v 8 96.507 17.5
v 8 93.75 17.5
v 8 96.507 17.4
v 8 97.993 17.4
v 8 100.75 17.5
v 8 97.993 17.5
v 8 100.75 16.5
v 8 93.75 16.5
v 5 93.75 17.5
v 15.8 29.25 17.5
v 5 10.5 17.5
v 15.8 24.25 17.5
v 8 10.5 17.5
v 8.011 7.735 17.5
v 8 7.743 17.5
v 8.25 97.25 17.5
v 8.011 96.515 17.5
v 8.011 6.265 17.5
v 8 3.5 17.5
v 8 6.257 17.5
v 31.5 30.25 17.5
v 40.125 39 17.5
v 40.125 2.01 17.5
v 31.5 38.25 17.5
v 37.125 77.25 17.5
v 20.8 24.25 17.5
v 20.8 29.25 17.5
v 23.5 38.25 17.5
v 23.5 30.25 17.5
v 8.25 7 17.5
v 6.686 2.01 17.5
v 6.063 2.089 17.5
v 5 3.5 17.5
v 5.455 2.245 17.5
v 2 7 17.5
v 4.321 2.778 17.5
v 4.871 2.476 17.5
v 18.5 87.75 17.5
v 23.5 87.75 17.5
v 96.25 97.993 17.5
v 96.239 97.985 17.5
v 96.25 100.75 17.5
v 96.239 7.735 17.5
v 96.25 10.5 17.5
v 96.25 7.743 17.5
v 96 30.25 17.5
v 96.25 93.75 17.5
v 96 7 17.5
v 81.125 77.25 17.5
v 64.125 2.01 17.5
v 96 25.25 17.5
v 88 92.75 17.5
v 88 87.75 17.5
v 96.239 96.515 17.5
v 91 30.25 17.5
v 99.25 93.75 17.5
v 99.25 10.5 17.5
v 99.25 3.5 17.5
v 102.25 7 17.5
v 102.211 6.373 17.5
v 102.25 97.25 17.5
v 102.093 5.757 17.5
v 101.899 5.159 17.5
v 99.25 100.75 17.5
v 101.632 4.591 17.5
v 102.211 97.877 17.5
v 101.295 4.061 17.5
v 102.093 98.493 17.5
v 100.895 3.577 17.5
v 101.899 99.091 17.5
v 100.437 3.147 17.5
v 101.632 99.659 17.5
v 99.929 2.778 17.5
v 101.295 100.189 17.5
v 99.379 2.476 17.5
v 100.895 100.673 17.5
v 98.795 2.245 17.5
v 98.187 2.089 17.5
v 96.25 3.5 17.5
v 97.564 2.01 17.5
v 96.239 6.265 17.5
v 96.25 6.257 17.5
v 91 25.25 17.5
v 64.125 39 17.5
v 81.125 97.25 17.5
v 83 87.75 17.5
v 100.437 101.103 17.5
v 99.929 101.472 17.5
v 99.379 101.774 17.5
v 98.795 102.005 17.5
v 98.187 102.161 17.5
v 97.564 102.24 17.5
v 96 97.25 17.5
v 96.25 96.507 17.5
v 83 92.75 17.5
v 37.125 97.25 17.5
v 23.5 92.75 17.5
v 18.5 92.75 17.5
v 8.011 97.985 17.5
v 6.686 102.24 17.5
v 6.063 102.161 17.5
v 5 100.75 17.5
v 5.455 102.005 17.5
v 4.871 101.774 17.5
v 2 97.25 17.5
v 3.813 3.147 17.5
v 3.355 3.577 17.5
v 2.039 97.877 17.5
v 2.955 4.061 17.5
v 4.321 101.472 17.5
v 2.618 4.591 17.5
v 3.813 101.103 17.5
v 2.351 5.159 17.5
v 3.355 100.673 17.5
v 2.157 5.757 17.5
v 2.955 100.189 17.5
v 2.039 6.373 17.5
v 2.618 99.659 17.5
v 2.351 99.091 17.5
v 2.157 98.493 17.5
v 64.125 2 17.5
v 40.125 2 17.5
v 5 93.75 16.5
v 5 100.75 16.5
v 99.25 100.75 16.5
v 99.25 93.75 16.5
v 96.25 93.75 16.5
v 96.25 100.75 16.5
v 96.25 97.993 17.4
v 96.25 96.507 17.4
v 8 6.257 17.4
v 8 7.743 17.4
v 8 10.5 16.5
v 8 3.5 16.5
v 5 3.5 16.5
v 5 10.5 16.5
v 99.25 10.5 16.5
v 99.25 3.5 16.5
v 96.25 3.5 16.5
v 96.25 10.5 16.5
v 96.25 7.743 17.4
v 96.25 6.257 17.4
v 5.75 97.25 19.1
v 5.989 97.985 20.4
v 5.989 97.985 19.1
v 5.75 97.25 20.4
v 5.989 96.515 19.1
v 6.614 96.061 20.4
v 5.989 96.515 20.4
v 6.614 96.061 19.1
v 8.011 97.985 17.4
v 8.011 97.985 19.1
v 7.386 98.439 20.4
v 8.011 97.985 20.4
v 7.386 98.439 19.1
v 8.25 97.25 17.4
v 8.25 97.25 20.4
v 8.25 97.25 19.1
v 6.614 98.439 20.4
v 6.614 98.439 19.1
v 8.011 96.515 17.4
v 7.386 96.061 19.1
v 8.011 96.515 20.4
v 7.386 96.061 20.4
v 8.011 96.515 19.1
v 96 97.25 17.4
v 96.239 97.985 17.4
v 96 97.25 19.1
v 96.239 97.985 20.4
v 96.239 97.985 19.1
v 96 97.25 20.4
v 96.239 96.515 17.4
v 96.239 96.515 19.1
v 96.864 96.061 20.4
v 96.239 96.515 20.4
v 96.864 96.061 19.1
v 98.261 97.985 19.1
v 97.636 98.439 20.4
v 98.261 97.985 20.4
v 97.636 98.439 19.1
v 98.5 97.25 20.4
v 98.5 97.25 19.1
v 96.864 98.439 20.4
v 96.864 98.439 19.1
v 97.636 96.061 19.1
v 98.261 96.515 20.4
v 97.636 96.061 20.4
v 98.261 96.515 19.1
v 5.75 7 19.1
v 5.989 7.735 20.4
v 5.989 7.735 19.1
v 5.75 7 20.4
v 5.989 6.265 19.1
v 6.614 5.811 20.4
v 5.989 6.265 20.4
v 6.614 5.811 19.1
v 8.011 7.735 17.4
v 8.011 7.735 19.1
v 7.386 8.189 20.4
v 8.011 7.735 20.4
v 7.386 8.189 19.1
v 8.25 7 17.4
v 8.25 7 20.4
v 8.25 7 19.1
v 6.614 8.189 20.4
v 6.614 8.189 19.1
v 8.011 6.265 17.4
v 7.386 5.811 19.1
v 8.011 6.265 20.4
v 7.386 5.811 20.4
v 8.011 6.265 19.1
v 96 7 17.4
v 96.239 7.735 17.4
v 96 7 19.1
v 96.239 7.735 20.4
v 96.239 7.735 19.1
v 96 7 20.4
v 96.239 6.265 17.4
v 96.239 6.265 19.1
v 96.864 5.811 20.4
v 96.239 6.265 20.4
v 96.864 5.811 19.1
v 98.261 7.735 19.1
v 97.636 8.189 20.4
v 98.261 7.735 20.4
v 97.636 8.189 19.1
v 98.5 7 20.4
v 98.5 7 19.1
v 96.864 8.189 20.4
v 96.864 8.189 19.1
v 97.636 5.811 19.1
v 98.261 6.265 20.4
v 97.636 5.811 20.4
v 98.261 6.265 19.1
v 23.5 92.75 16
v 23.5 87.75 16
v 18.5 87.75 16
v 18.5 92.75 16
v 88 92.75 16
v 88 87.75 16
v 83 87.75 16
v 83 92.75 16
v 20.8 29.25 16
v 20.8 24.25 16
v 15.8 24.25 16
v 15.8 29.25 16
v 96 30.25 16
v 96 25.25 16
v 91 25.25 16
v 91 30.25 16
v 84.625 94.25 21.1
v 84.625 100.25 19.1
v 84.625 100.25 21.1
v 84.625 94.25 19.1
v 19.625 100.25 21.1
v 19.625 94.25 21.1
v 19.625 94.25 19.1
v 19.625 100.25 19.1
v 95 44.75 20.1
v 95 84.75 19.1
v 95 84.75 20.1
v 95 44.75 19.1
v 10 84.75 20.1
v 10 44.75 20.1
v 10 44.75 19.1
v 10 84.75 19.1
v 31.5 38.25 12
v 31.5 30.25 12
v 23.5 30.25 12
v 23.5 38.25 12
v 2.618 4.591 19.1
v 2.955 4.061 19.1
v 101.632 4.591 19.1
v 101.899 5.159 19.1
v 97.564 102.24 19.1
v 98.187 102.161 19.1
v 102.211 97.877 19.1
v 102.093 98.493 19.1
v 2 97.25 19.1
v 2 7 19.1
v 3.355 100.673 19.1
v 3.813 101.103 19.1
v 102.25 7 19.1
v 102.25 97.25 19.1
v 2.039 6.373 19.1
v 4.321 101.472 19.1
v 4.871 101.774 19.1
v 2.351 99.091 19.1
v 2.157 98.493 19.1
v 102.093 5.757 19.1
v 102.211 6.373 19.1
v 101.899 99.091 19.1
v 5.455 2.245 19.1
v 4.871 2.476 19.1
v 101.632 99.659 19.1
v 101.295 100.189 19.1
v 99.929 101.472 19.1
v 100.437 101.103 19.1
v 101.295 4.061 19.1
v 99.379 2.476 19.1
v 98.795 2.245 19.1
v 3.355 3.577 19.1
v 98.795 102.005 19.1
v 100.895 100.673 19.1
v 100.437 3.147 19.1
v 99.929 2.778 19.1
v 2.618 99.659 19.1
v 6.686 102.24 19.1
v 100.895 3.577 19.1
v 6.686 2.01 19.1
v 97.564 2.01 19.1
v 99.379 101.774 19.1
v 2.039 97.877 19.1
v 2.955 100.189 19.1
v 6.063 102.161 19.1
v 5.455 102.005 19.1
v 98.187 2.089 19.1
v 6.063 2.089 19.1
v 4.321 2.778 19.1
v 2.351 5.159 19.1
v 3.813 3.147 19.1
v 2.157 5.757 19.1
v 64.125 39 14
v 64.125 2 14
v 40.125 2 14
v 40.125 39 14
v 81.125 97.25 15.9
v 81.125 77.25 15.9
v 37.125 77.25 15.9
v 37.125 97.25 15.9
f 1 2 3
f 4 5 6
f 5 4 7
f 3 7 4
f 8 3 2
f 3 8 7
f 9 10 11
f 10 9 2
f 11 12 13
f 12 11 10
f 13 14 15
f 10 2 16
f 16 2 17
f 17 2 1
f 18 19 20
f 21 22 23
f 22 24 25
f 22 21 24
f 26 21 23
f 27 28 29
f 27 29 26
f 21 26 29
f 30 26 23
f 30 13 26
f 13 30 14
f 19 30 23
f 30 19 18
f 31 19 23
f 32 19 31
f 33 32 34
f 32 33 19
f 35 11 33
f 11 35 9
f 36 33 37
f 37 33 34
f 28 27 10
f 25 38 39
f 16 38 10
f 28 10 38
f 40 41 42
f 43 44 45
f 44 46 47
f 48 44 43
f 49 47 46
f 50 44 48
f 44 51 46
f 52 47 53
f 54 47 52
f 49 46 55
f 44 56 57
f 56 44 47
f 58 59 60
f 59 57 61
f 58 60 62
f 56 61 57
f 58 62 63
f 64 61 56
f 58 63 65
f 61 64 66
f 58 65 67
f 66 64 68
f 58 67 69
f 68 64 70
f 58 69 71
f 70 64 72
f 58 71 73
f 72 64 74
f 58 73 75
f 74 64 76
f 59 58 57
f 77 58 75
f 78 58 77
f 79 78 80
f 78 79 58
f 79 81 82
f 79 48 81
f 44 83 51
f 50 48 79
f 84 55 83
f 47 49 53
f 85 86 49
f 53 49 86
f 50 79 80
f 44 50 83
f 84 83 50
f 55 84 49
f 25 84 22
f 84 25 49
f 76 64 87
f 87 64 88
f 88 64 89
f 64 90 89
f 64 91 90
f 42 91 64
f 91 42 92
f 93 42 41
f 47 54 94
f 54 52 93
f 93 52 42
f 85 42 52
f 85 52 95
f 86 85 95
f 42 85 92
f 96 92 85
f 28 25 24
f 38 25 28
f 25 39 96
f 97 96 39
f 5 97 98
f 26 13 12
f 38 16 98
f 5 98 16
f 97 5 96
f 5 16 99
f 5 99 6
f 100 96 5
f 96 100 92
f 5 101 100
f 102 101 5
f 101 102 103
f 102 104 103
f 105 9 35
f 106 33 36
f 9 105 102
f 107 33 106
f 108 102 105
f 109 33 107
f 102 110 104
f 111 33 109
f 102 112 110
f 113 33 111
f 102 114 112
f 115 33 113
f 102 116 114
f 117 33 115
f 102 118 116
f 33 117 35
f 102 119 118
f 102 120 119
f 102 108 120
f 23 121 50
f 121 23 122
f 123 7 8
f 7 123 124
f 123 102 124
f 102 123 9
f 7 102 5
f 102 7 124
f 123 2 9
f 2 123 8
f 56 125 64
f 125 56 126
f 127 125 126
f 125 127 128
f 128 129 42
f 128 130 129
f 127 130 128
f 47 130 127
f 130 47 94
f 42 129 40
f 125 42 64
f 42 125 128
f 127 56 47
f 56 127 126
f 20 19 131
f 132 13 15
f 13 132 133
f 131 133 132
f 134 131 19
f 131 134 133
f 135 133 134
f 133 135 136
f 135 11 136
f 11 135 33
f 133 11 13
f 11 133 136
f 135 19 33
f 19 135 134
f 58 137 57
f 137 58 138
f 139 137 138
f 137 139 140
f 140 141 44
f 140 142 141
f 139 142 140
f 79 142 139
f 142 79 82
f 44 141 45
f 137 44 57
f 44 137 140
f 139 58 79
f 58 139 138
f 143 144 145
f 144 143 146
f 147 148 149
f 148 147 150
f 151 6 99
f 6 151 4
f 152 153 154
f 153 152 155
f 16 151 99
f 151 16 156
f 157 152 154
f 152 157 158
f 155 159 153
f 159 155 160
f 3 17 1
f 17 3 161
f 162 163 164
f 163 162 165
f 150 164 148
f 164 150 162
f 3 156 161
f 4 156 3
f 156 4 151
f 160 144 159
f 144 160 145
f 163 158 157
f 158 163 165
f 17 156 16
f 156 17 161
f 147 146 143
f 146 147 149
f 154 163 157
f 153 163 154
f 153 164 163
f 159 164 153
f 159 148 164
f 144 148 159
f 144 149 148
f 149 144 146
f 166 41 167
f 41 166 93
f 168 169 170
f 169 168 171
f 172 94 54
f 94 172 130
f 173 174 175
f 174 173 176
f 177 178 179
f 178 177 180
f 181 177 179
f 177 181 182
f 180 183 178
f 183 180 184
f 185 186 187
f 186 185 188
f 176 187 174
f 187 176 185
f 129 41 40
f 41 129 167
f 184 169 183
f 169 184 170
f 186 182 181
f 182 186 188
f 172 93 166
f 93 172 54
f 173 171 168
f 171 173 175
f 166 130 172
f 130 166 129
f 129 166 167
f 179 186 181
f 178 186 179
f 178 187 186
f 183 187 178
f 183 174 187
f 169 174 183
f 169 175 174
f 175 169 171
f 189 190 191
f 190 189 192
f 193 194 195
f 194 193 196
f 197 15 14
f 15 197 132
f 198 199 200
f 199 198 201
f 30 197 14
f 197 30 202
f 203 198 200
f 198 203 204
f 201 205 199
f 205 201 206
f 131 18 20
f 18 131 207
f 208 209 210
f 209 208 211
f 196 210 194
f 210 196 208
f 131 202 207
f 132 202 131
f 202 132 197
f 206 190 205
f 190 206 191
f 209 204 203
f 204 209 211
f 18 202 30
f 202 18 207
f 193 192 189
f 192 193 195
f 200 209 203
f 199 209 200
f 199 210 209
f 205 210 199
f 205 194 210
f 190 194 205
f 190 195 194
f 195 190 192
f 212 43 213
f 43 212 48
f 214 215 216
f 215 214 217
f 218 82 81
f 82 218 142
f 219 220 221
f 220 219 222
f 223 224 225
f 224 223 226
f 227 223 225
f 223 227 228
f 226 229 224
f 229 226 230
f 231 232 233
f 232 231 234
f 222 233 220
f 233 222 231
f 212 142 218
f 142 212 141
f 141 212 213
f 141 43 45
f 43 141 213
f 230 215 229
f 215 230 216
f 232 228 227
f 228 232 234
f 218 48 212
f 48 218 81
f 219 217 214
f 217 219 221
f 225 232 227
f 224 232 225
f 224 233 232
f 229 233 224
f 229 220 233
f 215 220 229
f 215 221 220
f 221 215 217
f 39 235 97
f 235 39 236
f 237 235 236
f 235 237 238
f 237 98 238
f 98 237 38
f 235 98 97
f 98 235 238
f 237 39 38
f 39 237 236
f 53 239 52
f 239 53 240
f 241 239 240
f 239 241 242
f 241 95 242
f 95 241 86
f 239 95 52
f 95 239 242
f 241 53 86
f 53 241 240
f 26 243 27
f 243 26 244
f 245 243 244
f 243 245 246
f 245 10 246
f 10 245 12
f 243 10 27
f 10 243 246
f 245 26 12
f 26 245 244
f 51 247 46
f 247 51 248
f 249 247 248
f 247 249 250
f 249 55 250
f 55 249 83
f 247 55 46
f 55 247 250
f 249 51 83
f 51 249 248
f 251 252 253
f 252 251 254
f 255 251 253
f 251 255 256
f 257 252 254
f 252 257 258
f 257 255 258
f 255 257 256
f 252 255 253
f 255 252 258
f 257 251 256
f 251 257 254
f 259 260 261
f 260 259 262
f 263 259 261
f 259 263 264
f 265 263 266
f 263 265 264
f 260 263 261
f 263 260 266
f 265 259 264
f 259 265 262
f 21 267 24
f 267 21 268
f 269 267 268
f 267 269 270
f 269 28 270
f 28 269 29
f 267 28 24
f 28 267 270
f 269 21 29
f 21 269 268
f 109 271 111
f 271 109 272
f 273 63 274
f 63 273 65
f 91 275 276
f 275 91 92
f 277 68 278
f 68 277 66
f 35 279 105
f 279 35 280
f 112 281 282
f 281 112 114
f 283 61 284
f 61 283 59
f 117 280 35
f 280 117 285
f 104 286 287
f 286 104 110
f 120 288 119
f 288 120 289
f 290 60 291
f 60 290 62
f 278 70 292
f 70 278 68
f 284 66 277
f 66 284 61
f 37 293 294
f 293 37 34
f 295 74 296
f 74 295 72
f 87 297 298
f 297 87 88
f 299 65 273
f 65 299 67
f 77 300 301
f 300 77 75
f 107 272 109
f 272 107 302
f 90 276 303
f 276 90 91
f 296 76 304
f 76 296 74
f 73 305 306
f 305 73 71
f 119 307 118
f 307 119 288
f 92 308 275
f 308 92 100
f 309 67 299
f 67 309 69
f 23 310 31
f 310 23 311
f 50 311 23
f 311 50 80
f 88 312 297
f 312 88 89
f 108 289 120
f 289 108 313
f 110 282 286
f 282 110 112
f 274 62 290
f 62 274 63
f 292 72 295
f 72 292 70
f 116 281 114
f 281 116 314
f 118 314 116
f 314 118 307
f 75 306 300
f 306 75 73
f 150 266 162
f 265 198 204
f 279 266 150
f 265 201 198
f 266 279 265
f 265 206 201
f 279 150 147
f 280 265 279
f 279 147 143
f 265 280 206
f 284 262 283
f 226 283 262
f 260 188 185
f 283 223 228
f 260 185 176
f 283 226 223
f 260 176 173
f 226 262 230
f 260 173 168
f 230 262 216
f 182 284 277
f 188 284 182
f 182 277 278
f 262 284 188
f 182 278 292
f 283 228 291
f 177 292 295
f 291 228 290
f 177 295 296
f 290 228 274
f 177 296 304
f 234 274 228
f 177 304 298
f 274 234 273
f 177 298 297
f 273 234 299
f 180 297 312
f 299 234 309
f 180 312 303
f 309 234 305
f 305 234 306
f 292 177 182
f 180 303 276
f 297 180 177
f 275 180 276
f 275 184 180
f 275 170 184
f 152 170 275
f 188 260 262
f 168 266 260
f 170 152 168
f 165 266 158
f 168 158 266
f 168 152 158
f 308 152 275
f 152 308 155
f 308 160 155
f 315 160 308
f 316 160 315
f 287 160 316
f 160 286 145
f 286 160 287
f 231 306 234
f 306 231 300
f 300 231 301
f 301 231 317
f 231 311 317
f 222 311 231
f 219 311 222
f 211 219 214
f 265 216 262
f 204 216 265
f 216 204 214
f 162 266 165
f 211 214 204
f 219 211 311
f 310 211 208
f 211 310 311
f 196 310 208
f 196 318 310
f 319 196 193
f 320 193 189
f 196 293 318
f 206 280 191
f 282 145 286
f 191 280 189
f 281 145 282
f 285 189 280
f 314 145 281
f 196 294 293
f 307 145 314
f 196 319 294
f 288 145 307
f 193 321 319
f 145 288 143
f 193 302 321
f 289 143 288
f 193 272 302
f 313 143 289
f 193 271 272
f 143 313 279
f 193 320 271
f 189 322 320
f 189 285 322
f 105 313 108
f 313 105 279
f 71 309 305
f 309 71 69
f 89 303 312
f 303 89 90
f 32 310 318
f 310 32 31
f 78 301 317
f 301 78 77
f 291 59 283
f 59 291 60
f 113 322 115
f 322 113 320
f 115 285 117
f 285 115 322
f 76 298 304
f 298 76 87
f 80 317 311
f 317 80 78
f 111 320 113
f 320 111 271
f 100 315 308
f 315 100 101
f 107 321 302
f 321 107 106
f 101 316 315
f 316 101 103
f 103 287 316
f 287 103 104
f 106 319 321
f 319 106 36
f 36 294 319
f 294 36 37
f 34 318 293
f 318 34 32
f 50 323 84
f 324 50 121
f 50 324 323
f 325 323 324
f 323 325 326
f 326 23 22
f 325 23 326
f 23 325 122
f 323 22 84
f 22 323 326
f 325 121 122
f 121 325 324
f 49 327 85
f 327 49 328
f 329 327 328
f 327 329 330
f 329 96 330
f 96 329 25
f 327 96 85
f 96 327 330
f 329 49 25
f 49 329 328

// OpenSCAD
// -----------------------------------------------------------------
// Jedi Light Switch Enclosure.
// Designed to be an enclosure for the Jedi Light Switch PCB
// and fit over a UK (Possibly EU) Lightswitch.
// -----------------------------------------------------------------

// Define the switch type to be covered.
// This only effects the switch modeled to help visualise the case
// It does not effect the base or cover stl's.
// New style Single switch = 0
// New style Double switch = 1 - not implemented.
// Old style Single switch = 2
// Old style Double switch = 3
switchType  = 0; // Update depth also

// How deep the base & cover should be.
// For new style switch:
// depth = 16; // 19mm Gives plenty of room in new switches.
// For old style
depth = 19; // 28mm gives plenty
// Super skinny - helpful for test print to check sizes.
// depth = 5;

// Set to true to a minalist cover, goes a few mm over the PCB
// leaving most of the PCB exposed.
minimalCover = false;

// Which version of the PCB is to be used.
// The effects which cutouts are required
// at the top of the cover.
pcbVersion = 2;

// How deep to make the USB connector cutout.
// For ease of use this should be the same as, or deeper than 
// the depth of the cover so the cover can be fitted/removed 
// without disconnecting the USB connector.
usbConnectorCutoutDepth = depth;

// The gap to leave between the cover and the base when pushed together.
// Adjust this to give a tighter (smaller number) or looser (larger number) fit between
// the base and the cover. This will depend on your printer.
coverToBasegap = 0.2;

// Change these to show the various main components.
// They are modified through command line calls when generating STL files.
// e.g To generate the base stl file set showBase to true and everything else
// to false.
showCover = false;
showBase = false;
showPcb = true;
showSwitch = false;


// ------------------------------------------------------


            
// Size of the outer bezel that surounds the PCB
bezelSize = 2;

// Thickness of the cover wall.
// PCB overlap onto support = 2
// then add the bezel size to allow for an overall wall thickness.
wallThickness = 2 + bezelSize; // top wall thickness.
sideWallThickness = 2 + bezelSize;

// -----------------------------------------------------------------
// Jedi lightswitch PCB details
// -----------------------------------------------------------------
// PCB size we are trying to fit.
// PCB is 100, allow a small bodge
pcbHeight = 100.25;
pcbWidth = 100.25;
// How thick (deep) the front panel is (1.6mm FR4 PCB)
pcbThickness = 1.6;
// -----------------------------------------------------------------

// -----------------------------------------------------------------
// Compute the actual overall size required 
// for the outer enclosure.
// -----------------------------------------------------------------
height = pcbHeight + (2*bezelSize);
width = pcbWidth + (2*bezelSize);
// -----------------------------------------------------------------

// -----------------------------------------------------------------
// Wall Switch size (physical size of the light switch being covered)
// -----------------------------------------------------------------
switchHeight = pcbHeight-15; //88;
// switchWidth = 88;  // Original value.
switchWidth = 85; // Newer switches.
// How deep the switch is at the deepest part (e.g. to the top of the switches switch).
switchDepth = 22;
// How much the switch body should overlap onto the base
switchOverlap = 3;

middleDepth = 10;

// How deep the inside of the box is.
baseInnerThickness = 1;

// -----------------------------------------
// -----------------------------------------
module GenericBase(xDistance, yDistance, zHeight) {
	// roundedBox([xDistance, yDistance, zHeight], 2, true);

	// Create a rectangluar base to work from that
	// is xDistance by yDistance and zHeight height.

	// This is effectivly a cube with rounded corners

	// extend the base out by 3.5 from holes by using minkowski
	// which gives rounded corners to the board in the process
	// matching the Gadgeteer design
	
	$fn=50;
	radius = 5; //bezelSize;


	translate([radius,radius,0]) {
		minkowski()
		{
			// 3D Minkowski sum all dimensions will be the sum of the two object's dimensions
			cube([xDistance-(radius*2), yDistance-(radius*2), zHeight /2]);
			cylinder(r=radius,h=zHeight/2);
		}
	}
}



// -----------------------------------------
// Base for the switch, goes around existing lightswitch.
// -----------------------------------------
module LightSwitchBase() {
	
	difference() {
		union() 
		{
			// Outer base wall
			OuterWall();
		}		
		union() 
		{
			SwitchCutout();
			PcbCutout();
            CutOff();
		}
	}
}

// -----------------------------------------
// Main base outer wall
// -----------------------------------------
module OuterWall() {

    innerCutoutOffset = wallThickness; // bezelSize + x

	difference() {
		union() {
			GenericBase(width, height, depth);
		}
		union() {
			// Cut out the bulk of the inside of the box.
			translate([sideWallThickness, wallThickness, baseInnerThickness]) {
                
                // Rounded interial
				//GenericBase(width - (wallThickness* 2), 
				//					height - (innerCutoutOffset *2), 
				//					(depth - baseInnerThickness) + 1);
                
                // Square interia
                cube([width - (sideWallThickness * 2), 
                    height - (wallThickness *2), 
					(depth - baseInnerThickness) + 1]);
			}
		}
	}
}

// -----------------------------------------
// Cut out an area in the base for the switch allowing
// for an overlap to go under the switch which holds the case to the wall.
// -----------------------------------------
module SwitchCutout() {

	// Cutout smaller than the actual switch to allow for the overlap all around
	cutoutWidth = switchWidth - (switchOverlap*2);
	cutoutHeight = switchHeight - (switchOverlap*2);	

	// Padding either side of the cutout.
	paddingWidth = (width - cutoutWidth) / 2;
	paddingHeight = -10; // Fixed padding from top.

	// Switch cutout.
	// Cut out a area less wide than the switch so it sits on it 
	// keeping the box against the wall
	// -1 z to ensure it goes all the way through
	translate([paddingWidth, paddingHeight, -1]) {
		cube([cutoutWidth, height, 4]);
	}

	// Switch body
	// Create a block to show how the switch body sits
	// in the base.
	switchOuterPaddingWidth = (width - switchWidth) /2;
	switchOuterPaddingHeight = paddingHeight - switchOverlap;

	translate([switchOuterPaddingWidth , switchOuterPaddingHeight,1]) {
		color( [1, 0, 0, 0.90] ) {
            cube([switchWidth, switchHeight, switchDepth]);
		}
	}
}

// -----------------------------------------
// Cut out an area in the base for the PCB.
// -----------------------------------------
module PcbCutout() {
	// Move to a slight offset to allow for an outer bezel.
	// and position so the top of the pcb is at the top of the base box.
	translate([bezelSize, bezelSize, depth - (pcbThickness - 0.1)]) {
		Pcb();        
	}
}

// -----------------------------------------
// Generate a model of the PCB.
// -----------------------------------------
module Pcb() {
    photonWidth = 24;
    photonHeight = 37;
    photonDepth = 3.5;
        
    // PCB.
    color( "purple" ) {
        GenericBase(pcbWidth, pcbHeight, pcbThickness);
    }
        
    // Photon
    translate([(pcbWidth/2) - (photonWidth /2),0 , -(photonDepth)]) {
        cube([photonWidth, photonHeight, photonDepth]);
    }
        
    // LEDs
    ledOffsetFromSide = 3;
    ledOffsetFromTopBottom = 1.5;
    ledWidth = 3; // Include the resistor and LED and a small fudge for the oversized PCB.
    ledHeight = 7;
    ledDepth = 1;
    
    color( "blue" )  {
        // Top left LED
        // 0,0,0 bottom left.
        translate([
                    0 + ledOffsetFromSide,
                    pcbHeight - ledOffsetFromTopBottom - ledHeight,
                    -ledDepth]) {
            cube ([ledWidth, ledHeight, ledDepth]);
        }
       
        
        // top right LED
        translate([
                    pcbWidth - ledOffsetFromSide - ledWidth,
                    pcbHeight - ledOffsetFromTopBottom - ledHeight,-ledDepth]) {
            cube ([ledWidth, ledHeight, ledDepth]);
        }
        
        // Bottom Left LED.
        translate([
                0 + ledOffsetFromSide,
                ledOffsetFromTopBottom,
                -ledDepth]) {
            cube ([ledWidth, ledHeight, ledDepth]);
        }
        
        // Bottom Right LED.
        translate([
                pcbWidth - ledOffsetFromSide - ledWidth,
                ledOffsetFromTopBottom,
                -ledDepth]) {
            cube ([ledWidth, ledHeight, ledDepth]);
        }
        
        // Show LED holes with LEDs shining through
        // LED hole
        translate([
                    0 + 5,
                    pcbHeight - 5,
                    -0.1]) {
            cylinder(d=2.5, h=3, $fn=10);
        }
        
        translate([
                    pcbWidth - 5,
                    pcbHeight - 5,
                    -0.1]) {
            cylinder(d=2.5, h=3, $fn=10);
        }
        
        translate([
                    0 + 5,
                    5,
                    -0.1]) {
            cylinder(d=2.5, h=3, $fn=10);
        }
        
        translate([pcbWidth - 5,
                    5,
                    -0.1]) {
            cylinder(d=2.5, h=3, $fn=10);
        }
    }
    
    // components for sensors on the base of the board.
    // V1.1 this is not such as issue as they are 4 mm from edge.
    translate([(pcbWidth/2) -15 ,pcbHeight - 25, -pcbThickness]) {
        cube([44, 20, ledDepth + pcbThickness]);
    }
    
    // Show different model of PCB sensors
    // for the second version.
    // TODO: Include battery connector and Neopixels 
    // on the base as well.
    if (pcbVersion == 1) {
        // Humidity and gesture components on the board top.
        // 2.5mm offset from board top.
        // 10mm heihg
        // 6mm wide
        // actually 2mm hight but project 5mm to make it stand out.
        translate([(pcbWidth/2) -3 ,pcbHeight - 10 - 2.5, pcbThickness]) {
            color( "black" ) cube([6, 10, 2]);
        }
        
        // Small raised area to indicade the touch pad.
        // touch pad is 19mm from top.
        // 40mm height
        // 85mm wide
        // 8mm from left/right edge.
        touchPad(19, pcbHeight, pcbThickness );
    } else if (pcbVersion == 2) {
        // Single row of 5 sensors.
        translate([(pcbWidth/2) - 32.5 ,pcbHeight - 8, pcbThickness]) {
            color( "black" ) {
                cube([65, 6, 2]);
            }
        }
        
        // Small raised area to indicade the touch pad.
        // touch pad is 17.5mm from top.
        touchPad(17.5, pcbHeight, pcbThickness);
        
        // Include the JST Connector for V2 as this
        // can hit the switch.
        JSTConnector();
        NeoPixels();
    }
}

module JSTConnector() {
    // 8mm hight
    // 64mm down from top
    // 5.5mm high
    translate([21.5,pcbHeight-8-64, -5.5]) {
        color( "black" ) {
            cube([8, 8, 5.5]);
        }
    }
}

module NeoPixels() {
    NeoPixel(16.5,9.5);
    NeoPixel(81,9.5);
    NeoPixel(13.8,73);
    NeoPixel(89,72);
    
}

module NeoPixel(x,y) {
    neoPixelWidth = 5.0;
    neoPixelHeight = 5.0;
    neoPixelDepth = 1.5;
    
    translate([x,pcbHeight-neoPixelHeight-y, -neoPixelDepth]) {
        color( "yellow" ) {
            cube([neoPixelWidth, neoPixelHeight, neoPixelDepth]);
        }
    }
}

// -----------------------------------------
// Show the touch area on the PCB.
// -----------------------------------------
module touchPad(yPosition, pcbHeight, pcbThickness ) {
    height = 40; 
    width = 85;
    // 8mm from left/right edge.
    translate([8,pcbHeight-height-yPosition, 0]) {
        color( "SteelBlue" )  {
            cube([width , height , pcbThickness + 1]);
        }
    }
}

// -----------------------------------------
// Cutoff the end of the switch to allow it to be pushed over the lightswitch 
// and slid down. The outer cover will hide this missing piece.
// -----------------------------------------
module CutOff() {     
    // +2mm on switch width to allow for a small tolerance.
    cutoutOffset = (width - (switchWidth+2)) / 2;
    cutoutWidth = width - (wallThickness*2) - (switchOverlap*2) + 2*2;
    
    translate([cutoutOffset,0,0]) {
        cube([switchWidth+2,wallThickness  ,depth+2]);
    }
}

// -----------------------------------------
// This is the outer cover that goes over the base and
// holds the PCB in place.
// -----------------------------------------
module Cover() {
    coverWallThickness = 2;
    
    coverWidth = width + coverWallThickness*2;
    coverHeight = height + coverWallThickness*2;
        
    // Cover depth to match the overall depth of the base
    // plus the additional cover top thickness
    // then allow 1mm gap for wall edge variances so it's a snug-ish fit
    // ensuring cover goes fully onto base.
    coverWallOffset = 1;
    coverDepth = depth + coverWallThickness - coverWallOffset;
    coverTopThickness = 1;
       
    usbHeight = 10; // Height here is in the z axid.
    usbWidth = 13;
    
    // How much over the top (sensors) the cover should cover.
    coverTopOverlap = 21;
        
    includeBottomVentHoles = true;
    ventWidth = width - 40;
    ventHeight = 8;
    
    difference() {
		union() {
			GenericBase(coverWidth, coverHeight, coverDepth);
		}
		union() {
            // Hollow out to fit around the base.
            translate([coverWallThickness - coverToBasegap, 
                            coverWallThickness - coverToBasegap, 
                            -coverTopThickness]) {
                    GenericBase(width + (coverToBasegap*2), height + (coverToBasegap*2), coverDepth);
            }
            
            // Cutout for the USB connector...
            translate([(coverWidth/2)-(usbWidth/2),
                        coverHeight - coverWallThickness - 1,
                        depth-(coverTopThickness + usbConnectorCutoutDepth)]) {
                cube([usbWidth,coverWallThickness+2,usbConnectorCutoutDepth]);
                // TODO: Put cylinders on ends to make it rounded.
            }
            
            // Add some vent holes in the bottom to allow air
            // circulation and for light to escape when using "Glow"
            if (includeBottomVentHoles) {
                translate([(coverWidth/2)-(ventWidth/2),
                        coverHeight - coverWallThickness - 1,
                        0]) {
                    #cube([ventWidth,coverWallThickness+2,ventHeight]);
                }
            }
                
            if (minimalCover) {
                // Allow for cover thickness, the base bexel size.
                // base has 2mm PCB overlap
                overlap = coverWallThickness + bezelSize + 2;
                doubleOverlap = overlap * 2;
                
                // Cut out the main PCB area
                translate([overlap,overlap,+2]) {
                    GenericBase(coverWidth-doubleOverlap, coverHeight- doubleOverlap, coverDepth);
                }
            } else {
                if (pcbVersion == 1) {
                    coverCutoutsV1(coverWidth, 
                                coverHeight, 
                                coverWallThickness, 
                                coverTopThickness,
                                coverDepth, 
                                coverTopOverlap, 
                                coverWallOffset);
                } else if (pcbVersion == 2) {
                    coverCutoutsV2(coverWidth, 
                                coverHeight, 
                                coverWallThickness, 
                                coverTopThickness,
                                coverDepth, 
                                coverTopOverlap, 
                                coverWallOffset);
                }
            }
        }
	}
}

// -----------------------------------------
// Defines the parts of the cover to be cutout for the V1 board.
// -----------------------------------------
module coverCutoutsV1(coverWidth, 
                    coverHeight, 
                    coverWallThickness, 
                    coverTopThickness,
                    coverDepth, 
                    coverTopOverlap, 
                    coverWallOffset) {

    // How far down from the top of the cover the opening for the sensor set should be.
    sensorSetTopOffset = 3.5;
    sensorSetHeight = 12;
    sensorSetWidth = 8;
        
    touchCoverCutouts(coverWidth,
                    coverHeight, 
                    coverWallThickness, 
                    coverTopThickness,
                    coverDepth, 
                    coverTopOverlap, 
                    coverWallOffset);
                
    // Cut out the space for the sensors.
    // move down coverWallThickness + 2mm 
    // from top so some PCB is covered.           
    translate([(coverWidth/2),
                coverWallThickness + sensorSetTopOffset + (sensorSetWidth/2)-1,
                depth-coverTopThickness + coverWallOffset]) {
        #cylinder(d=sensorSetWidth, h=coverTopThickness, $fn=20);
    }
                
    translate([(coverWidth/2),
                coverWallThickness + sensorSetTopOffset + sensorSetHeight - (sensorSetWidth/2) + 1,
                depth-coverTopThickness + coverWallOffset]) {
        #cylinder(d=sensorSetWidth, h=coverTopThickness, $fn=20);
    }
                
    // Join the two cylinders to make the cutout oblong
    translate([(coverWidth/2)-(sensorSetWidth/2),
                coverWallThickness + sensorSetTopOffset + 3,
                depth-coverTopThickness + coverWallOffset]) {
        #cube([sensorSetWidth,sensorSetHeight-6,coverTopThickness]);
    }
    
    // Don't include LED holes as material is most likely thin enough
    // for the LEDs to shine through without needing extra holes.
}

// -----------------------------------------
// Defines the parts of the cover to be cutout for the V1 board.
// -----------------------------------------
module coverCutoutsV2(coverWidth, 
                    coverHeight, 
                    coverWallThickness, 
                    coverTopThickness,
                    coverDepth, 
                    coverTopOverlap, 
                    coverWallOffset) {

    // How far down from the top of the cover the opening for the sensor set should be.
    sensorSetTopOffset = 3;
    sensorSetHeight = 8;
    sensorSetWidth = 65;
                                                  
    touchCoverCutouts(coverWidth,
                    coverHeight, 
                    coverWallThickness, 
                    coverTopThickness,
                    coverDepth, 
                    coverTopOverlap-1.5, 
                    coverWallOffset);
   
    // Cut out the space for the sensors.
    // move down coverWallThickness + n mm 
    // from top so some PCB is covered.            
    translate([(coverWidth/2) - (sensorSetWidth/2),
                coverWallThickness + sensorSetTopOffset + (sensorSetHeight/2),
                depth-coverTopThickness + coverWallOffset]) {
        #cylinder(d=sensorSetHeight, h=coverTopThickness, $fn=20);
    }
                
    translate([(coverWidth/2) + (sensorSetWidth/2),
                coverWallThickness + sensorSetTopOffset + (sensorSetHeight/2),
                depth-coverTopThickness + coverWallOffset]) {
        #cylinder(d=sensorSetHeight, h=coverTopThickness, $fn=20);
    }
                
    // Join the two cylinders to make the cutout oblong
    translate([(coverWidth/2)-(sensorSetWidth/2),
                coverWallThickness + sensorSetTopOffset,
                depth-coverTopThickness + coverWallOffset]) {
        #cube([sensorSetWidth,sensorSetHeight,coverTopThickness]);
    }
                                
    // Don't include LED holes as material is most likely thin enough
    // for the LEDs to shine through without needing extra holes.
}

// -----------------------------------------
// Defines the parts of the cover to be cutout for the touch sensor
// -----------------------------------------
module touchCoverCutouts(coverWidth, 
                    coverHeight, 
                    coverWallThickness, 
                    coverTopThickness,
                    coverDepth, 
                    coverTopOverlap, 
                    coverWallOffset) {
    
    // How much over the bottom the cover should cover.
    // this hides the non-touchable zone (where the Photon would mess
    // with tuch sensor.
    coverBottomOverlap = coverHeight - (coverTopOverlap + 40 + 4);
                            
    // Cut out the main touch switch area.
    // Gives an overlap of 10mm on the PCB left and right
    // and a larger overlap at the top to cover the sensor area.
    // and matching overlap at the bottom to give it some sym.
    translate([10,coverTopOverlap,+2]) {
        GenericBase(coverWidth-20, coverHeight- (coverTopOverlap + coverBottomOverlap ), coverDepth);
    }
}


// -----------------------------------------
// Show the model of the switch.
// NB: Do not include when generating stl's
// -----------------------------------------
module Switch(xOffset, yOffset, zOffset) {
    translate([xOffset, yOffset, zOffset]) {
        color( [0, 0, 1, 1] ) {
                       
            if(switchType == 0) {            
                // New style switches
                switchBodyDepth = 8.5;
                switchSwitchDepth = 4; // on top of the body.
                
                // Square switch base
                // Switch depth = 8.5mm.
                cube([switchWidth, switchHeight, switchBodyDepth]);
                
                // Put the actual switch switch on the base.
                translate([(switchWidth /2) - 8, (switchHeight/2) - 13, switchBodyDepth]) {
                    cube([16, 26, switchSwitchDepth]);
                }
            } else if(switchType == 2) {
                // Old style lever switch
                
                // Square switch base
                cube([switchWidth, switchHeight, 16]);
                
                // Put the actual switch switch on the base
                // Show switch on the on position only as it would be expected tobe.
                // Make switch y=22mm for full range.
                translate([(switchWidth /2) - 4, (switchHeight/2)-11, 16]) {
                    cube([8, 11, 8]);
                }
            } else if(switchType == 3) {
                // Old style lever switch
                
                // Square switch base
                cube([switchWidth, switchHeight, 16]);
                
                // Put the actual switch switch on the base
                // Show switch for On & Off as either switch
                // may be in that state as this is typically
                // a landing/hall switch and has a second switch
                translate([(switchWidth /2) - 13, (switchHeight/2)-11, 16]) {
                    cube([26, 22, 8]);
                }
            }
		}
    }
}





// -----------------------------------------
// MAIN
// -----------------------------------------

if (showBase) {
    LightSwitchBase();
}

if (showCover) {
    // Case top rotated 180° (well openings swapped around.
    // so rotate and adjust position os they sit ontop.
    rotate(180) {
        
        // Adjust x offset to move cover up/down onto base.
        translate([-width -2.2,-height -2.2,0]) {
            color( [0, 1, 0, 1] ) {
               Cover();
            }
        }
    }
}

// Optional models to help visualise the enclosure.

if (showSwitch) {
    // Show the actual light switch we are covering
    // comment out when generating STLs.
    switchX = (width - switchWidth) /2;
    Switch(switchX,14,1);
}

if (showPcb) {
    // Show the PCB (in purple)
    // comment out when generating STLs.
    translate([bezelSize, bezelSize, depth - (pcbThickness - 0.1)]) {
        Pcb();        
    }
}
